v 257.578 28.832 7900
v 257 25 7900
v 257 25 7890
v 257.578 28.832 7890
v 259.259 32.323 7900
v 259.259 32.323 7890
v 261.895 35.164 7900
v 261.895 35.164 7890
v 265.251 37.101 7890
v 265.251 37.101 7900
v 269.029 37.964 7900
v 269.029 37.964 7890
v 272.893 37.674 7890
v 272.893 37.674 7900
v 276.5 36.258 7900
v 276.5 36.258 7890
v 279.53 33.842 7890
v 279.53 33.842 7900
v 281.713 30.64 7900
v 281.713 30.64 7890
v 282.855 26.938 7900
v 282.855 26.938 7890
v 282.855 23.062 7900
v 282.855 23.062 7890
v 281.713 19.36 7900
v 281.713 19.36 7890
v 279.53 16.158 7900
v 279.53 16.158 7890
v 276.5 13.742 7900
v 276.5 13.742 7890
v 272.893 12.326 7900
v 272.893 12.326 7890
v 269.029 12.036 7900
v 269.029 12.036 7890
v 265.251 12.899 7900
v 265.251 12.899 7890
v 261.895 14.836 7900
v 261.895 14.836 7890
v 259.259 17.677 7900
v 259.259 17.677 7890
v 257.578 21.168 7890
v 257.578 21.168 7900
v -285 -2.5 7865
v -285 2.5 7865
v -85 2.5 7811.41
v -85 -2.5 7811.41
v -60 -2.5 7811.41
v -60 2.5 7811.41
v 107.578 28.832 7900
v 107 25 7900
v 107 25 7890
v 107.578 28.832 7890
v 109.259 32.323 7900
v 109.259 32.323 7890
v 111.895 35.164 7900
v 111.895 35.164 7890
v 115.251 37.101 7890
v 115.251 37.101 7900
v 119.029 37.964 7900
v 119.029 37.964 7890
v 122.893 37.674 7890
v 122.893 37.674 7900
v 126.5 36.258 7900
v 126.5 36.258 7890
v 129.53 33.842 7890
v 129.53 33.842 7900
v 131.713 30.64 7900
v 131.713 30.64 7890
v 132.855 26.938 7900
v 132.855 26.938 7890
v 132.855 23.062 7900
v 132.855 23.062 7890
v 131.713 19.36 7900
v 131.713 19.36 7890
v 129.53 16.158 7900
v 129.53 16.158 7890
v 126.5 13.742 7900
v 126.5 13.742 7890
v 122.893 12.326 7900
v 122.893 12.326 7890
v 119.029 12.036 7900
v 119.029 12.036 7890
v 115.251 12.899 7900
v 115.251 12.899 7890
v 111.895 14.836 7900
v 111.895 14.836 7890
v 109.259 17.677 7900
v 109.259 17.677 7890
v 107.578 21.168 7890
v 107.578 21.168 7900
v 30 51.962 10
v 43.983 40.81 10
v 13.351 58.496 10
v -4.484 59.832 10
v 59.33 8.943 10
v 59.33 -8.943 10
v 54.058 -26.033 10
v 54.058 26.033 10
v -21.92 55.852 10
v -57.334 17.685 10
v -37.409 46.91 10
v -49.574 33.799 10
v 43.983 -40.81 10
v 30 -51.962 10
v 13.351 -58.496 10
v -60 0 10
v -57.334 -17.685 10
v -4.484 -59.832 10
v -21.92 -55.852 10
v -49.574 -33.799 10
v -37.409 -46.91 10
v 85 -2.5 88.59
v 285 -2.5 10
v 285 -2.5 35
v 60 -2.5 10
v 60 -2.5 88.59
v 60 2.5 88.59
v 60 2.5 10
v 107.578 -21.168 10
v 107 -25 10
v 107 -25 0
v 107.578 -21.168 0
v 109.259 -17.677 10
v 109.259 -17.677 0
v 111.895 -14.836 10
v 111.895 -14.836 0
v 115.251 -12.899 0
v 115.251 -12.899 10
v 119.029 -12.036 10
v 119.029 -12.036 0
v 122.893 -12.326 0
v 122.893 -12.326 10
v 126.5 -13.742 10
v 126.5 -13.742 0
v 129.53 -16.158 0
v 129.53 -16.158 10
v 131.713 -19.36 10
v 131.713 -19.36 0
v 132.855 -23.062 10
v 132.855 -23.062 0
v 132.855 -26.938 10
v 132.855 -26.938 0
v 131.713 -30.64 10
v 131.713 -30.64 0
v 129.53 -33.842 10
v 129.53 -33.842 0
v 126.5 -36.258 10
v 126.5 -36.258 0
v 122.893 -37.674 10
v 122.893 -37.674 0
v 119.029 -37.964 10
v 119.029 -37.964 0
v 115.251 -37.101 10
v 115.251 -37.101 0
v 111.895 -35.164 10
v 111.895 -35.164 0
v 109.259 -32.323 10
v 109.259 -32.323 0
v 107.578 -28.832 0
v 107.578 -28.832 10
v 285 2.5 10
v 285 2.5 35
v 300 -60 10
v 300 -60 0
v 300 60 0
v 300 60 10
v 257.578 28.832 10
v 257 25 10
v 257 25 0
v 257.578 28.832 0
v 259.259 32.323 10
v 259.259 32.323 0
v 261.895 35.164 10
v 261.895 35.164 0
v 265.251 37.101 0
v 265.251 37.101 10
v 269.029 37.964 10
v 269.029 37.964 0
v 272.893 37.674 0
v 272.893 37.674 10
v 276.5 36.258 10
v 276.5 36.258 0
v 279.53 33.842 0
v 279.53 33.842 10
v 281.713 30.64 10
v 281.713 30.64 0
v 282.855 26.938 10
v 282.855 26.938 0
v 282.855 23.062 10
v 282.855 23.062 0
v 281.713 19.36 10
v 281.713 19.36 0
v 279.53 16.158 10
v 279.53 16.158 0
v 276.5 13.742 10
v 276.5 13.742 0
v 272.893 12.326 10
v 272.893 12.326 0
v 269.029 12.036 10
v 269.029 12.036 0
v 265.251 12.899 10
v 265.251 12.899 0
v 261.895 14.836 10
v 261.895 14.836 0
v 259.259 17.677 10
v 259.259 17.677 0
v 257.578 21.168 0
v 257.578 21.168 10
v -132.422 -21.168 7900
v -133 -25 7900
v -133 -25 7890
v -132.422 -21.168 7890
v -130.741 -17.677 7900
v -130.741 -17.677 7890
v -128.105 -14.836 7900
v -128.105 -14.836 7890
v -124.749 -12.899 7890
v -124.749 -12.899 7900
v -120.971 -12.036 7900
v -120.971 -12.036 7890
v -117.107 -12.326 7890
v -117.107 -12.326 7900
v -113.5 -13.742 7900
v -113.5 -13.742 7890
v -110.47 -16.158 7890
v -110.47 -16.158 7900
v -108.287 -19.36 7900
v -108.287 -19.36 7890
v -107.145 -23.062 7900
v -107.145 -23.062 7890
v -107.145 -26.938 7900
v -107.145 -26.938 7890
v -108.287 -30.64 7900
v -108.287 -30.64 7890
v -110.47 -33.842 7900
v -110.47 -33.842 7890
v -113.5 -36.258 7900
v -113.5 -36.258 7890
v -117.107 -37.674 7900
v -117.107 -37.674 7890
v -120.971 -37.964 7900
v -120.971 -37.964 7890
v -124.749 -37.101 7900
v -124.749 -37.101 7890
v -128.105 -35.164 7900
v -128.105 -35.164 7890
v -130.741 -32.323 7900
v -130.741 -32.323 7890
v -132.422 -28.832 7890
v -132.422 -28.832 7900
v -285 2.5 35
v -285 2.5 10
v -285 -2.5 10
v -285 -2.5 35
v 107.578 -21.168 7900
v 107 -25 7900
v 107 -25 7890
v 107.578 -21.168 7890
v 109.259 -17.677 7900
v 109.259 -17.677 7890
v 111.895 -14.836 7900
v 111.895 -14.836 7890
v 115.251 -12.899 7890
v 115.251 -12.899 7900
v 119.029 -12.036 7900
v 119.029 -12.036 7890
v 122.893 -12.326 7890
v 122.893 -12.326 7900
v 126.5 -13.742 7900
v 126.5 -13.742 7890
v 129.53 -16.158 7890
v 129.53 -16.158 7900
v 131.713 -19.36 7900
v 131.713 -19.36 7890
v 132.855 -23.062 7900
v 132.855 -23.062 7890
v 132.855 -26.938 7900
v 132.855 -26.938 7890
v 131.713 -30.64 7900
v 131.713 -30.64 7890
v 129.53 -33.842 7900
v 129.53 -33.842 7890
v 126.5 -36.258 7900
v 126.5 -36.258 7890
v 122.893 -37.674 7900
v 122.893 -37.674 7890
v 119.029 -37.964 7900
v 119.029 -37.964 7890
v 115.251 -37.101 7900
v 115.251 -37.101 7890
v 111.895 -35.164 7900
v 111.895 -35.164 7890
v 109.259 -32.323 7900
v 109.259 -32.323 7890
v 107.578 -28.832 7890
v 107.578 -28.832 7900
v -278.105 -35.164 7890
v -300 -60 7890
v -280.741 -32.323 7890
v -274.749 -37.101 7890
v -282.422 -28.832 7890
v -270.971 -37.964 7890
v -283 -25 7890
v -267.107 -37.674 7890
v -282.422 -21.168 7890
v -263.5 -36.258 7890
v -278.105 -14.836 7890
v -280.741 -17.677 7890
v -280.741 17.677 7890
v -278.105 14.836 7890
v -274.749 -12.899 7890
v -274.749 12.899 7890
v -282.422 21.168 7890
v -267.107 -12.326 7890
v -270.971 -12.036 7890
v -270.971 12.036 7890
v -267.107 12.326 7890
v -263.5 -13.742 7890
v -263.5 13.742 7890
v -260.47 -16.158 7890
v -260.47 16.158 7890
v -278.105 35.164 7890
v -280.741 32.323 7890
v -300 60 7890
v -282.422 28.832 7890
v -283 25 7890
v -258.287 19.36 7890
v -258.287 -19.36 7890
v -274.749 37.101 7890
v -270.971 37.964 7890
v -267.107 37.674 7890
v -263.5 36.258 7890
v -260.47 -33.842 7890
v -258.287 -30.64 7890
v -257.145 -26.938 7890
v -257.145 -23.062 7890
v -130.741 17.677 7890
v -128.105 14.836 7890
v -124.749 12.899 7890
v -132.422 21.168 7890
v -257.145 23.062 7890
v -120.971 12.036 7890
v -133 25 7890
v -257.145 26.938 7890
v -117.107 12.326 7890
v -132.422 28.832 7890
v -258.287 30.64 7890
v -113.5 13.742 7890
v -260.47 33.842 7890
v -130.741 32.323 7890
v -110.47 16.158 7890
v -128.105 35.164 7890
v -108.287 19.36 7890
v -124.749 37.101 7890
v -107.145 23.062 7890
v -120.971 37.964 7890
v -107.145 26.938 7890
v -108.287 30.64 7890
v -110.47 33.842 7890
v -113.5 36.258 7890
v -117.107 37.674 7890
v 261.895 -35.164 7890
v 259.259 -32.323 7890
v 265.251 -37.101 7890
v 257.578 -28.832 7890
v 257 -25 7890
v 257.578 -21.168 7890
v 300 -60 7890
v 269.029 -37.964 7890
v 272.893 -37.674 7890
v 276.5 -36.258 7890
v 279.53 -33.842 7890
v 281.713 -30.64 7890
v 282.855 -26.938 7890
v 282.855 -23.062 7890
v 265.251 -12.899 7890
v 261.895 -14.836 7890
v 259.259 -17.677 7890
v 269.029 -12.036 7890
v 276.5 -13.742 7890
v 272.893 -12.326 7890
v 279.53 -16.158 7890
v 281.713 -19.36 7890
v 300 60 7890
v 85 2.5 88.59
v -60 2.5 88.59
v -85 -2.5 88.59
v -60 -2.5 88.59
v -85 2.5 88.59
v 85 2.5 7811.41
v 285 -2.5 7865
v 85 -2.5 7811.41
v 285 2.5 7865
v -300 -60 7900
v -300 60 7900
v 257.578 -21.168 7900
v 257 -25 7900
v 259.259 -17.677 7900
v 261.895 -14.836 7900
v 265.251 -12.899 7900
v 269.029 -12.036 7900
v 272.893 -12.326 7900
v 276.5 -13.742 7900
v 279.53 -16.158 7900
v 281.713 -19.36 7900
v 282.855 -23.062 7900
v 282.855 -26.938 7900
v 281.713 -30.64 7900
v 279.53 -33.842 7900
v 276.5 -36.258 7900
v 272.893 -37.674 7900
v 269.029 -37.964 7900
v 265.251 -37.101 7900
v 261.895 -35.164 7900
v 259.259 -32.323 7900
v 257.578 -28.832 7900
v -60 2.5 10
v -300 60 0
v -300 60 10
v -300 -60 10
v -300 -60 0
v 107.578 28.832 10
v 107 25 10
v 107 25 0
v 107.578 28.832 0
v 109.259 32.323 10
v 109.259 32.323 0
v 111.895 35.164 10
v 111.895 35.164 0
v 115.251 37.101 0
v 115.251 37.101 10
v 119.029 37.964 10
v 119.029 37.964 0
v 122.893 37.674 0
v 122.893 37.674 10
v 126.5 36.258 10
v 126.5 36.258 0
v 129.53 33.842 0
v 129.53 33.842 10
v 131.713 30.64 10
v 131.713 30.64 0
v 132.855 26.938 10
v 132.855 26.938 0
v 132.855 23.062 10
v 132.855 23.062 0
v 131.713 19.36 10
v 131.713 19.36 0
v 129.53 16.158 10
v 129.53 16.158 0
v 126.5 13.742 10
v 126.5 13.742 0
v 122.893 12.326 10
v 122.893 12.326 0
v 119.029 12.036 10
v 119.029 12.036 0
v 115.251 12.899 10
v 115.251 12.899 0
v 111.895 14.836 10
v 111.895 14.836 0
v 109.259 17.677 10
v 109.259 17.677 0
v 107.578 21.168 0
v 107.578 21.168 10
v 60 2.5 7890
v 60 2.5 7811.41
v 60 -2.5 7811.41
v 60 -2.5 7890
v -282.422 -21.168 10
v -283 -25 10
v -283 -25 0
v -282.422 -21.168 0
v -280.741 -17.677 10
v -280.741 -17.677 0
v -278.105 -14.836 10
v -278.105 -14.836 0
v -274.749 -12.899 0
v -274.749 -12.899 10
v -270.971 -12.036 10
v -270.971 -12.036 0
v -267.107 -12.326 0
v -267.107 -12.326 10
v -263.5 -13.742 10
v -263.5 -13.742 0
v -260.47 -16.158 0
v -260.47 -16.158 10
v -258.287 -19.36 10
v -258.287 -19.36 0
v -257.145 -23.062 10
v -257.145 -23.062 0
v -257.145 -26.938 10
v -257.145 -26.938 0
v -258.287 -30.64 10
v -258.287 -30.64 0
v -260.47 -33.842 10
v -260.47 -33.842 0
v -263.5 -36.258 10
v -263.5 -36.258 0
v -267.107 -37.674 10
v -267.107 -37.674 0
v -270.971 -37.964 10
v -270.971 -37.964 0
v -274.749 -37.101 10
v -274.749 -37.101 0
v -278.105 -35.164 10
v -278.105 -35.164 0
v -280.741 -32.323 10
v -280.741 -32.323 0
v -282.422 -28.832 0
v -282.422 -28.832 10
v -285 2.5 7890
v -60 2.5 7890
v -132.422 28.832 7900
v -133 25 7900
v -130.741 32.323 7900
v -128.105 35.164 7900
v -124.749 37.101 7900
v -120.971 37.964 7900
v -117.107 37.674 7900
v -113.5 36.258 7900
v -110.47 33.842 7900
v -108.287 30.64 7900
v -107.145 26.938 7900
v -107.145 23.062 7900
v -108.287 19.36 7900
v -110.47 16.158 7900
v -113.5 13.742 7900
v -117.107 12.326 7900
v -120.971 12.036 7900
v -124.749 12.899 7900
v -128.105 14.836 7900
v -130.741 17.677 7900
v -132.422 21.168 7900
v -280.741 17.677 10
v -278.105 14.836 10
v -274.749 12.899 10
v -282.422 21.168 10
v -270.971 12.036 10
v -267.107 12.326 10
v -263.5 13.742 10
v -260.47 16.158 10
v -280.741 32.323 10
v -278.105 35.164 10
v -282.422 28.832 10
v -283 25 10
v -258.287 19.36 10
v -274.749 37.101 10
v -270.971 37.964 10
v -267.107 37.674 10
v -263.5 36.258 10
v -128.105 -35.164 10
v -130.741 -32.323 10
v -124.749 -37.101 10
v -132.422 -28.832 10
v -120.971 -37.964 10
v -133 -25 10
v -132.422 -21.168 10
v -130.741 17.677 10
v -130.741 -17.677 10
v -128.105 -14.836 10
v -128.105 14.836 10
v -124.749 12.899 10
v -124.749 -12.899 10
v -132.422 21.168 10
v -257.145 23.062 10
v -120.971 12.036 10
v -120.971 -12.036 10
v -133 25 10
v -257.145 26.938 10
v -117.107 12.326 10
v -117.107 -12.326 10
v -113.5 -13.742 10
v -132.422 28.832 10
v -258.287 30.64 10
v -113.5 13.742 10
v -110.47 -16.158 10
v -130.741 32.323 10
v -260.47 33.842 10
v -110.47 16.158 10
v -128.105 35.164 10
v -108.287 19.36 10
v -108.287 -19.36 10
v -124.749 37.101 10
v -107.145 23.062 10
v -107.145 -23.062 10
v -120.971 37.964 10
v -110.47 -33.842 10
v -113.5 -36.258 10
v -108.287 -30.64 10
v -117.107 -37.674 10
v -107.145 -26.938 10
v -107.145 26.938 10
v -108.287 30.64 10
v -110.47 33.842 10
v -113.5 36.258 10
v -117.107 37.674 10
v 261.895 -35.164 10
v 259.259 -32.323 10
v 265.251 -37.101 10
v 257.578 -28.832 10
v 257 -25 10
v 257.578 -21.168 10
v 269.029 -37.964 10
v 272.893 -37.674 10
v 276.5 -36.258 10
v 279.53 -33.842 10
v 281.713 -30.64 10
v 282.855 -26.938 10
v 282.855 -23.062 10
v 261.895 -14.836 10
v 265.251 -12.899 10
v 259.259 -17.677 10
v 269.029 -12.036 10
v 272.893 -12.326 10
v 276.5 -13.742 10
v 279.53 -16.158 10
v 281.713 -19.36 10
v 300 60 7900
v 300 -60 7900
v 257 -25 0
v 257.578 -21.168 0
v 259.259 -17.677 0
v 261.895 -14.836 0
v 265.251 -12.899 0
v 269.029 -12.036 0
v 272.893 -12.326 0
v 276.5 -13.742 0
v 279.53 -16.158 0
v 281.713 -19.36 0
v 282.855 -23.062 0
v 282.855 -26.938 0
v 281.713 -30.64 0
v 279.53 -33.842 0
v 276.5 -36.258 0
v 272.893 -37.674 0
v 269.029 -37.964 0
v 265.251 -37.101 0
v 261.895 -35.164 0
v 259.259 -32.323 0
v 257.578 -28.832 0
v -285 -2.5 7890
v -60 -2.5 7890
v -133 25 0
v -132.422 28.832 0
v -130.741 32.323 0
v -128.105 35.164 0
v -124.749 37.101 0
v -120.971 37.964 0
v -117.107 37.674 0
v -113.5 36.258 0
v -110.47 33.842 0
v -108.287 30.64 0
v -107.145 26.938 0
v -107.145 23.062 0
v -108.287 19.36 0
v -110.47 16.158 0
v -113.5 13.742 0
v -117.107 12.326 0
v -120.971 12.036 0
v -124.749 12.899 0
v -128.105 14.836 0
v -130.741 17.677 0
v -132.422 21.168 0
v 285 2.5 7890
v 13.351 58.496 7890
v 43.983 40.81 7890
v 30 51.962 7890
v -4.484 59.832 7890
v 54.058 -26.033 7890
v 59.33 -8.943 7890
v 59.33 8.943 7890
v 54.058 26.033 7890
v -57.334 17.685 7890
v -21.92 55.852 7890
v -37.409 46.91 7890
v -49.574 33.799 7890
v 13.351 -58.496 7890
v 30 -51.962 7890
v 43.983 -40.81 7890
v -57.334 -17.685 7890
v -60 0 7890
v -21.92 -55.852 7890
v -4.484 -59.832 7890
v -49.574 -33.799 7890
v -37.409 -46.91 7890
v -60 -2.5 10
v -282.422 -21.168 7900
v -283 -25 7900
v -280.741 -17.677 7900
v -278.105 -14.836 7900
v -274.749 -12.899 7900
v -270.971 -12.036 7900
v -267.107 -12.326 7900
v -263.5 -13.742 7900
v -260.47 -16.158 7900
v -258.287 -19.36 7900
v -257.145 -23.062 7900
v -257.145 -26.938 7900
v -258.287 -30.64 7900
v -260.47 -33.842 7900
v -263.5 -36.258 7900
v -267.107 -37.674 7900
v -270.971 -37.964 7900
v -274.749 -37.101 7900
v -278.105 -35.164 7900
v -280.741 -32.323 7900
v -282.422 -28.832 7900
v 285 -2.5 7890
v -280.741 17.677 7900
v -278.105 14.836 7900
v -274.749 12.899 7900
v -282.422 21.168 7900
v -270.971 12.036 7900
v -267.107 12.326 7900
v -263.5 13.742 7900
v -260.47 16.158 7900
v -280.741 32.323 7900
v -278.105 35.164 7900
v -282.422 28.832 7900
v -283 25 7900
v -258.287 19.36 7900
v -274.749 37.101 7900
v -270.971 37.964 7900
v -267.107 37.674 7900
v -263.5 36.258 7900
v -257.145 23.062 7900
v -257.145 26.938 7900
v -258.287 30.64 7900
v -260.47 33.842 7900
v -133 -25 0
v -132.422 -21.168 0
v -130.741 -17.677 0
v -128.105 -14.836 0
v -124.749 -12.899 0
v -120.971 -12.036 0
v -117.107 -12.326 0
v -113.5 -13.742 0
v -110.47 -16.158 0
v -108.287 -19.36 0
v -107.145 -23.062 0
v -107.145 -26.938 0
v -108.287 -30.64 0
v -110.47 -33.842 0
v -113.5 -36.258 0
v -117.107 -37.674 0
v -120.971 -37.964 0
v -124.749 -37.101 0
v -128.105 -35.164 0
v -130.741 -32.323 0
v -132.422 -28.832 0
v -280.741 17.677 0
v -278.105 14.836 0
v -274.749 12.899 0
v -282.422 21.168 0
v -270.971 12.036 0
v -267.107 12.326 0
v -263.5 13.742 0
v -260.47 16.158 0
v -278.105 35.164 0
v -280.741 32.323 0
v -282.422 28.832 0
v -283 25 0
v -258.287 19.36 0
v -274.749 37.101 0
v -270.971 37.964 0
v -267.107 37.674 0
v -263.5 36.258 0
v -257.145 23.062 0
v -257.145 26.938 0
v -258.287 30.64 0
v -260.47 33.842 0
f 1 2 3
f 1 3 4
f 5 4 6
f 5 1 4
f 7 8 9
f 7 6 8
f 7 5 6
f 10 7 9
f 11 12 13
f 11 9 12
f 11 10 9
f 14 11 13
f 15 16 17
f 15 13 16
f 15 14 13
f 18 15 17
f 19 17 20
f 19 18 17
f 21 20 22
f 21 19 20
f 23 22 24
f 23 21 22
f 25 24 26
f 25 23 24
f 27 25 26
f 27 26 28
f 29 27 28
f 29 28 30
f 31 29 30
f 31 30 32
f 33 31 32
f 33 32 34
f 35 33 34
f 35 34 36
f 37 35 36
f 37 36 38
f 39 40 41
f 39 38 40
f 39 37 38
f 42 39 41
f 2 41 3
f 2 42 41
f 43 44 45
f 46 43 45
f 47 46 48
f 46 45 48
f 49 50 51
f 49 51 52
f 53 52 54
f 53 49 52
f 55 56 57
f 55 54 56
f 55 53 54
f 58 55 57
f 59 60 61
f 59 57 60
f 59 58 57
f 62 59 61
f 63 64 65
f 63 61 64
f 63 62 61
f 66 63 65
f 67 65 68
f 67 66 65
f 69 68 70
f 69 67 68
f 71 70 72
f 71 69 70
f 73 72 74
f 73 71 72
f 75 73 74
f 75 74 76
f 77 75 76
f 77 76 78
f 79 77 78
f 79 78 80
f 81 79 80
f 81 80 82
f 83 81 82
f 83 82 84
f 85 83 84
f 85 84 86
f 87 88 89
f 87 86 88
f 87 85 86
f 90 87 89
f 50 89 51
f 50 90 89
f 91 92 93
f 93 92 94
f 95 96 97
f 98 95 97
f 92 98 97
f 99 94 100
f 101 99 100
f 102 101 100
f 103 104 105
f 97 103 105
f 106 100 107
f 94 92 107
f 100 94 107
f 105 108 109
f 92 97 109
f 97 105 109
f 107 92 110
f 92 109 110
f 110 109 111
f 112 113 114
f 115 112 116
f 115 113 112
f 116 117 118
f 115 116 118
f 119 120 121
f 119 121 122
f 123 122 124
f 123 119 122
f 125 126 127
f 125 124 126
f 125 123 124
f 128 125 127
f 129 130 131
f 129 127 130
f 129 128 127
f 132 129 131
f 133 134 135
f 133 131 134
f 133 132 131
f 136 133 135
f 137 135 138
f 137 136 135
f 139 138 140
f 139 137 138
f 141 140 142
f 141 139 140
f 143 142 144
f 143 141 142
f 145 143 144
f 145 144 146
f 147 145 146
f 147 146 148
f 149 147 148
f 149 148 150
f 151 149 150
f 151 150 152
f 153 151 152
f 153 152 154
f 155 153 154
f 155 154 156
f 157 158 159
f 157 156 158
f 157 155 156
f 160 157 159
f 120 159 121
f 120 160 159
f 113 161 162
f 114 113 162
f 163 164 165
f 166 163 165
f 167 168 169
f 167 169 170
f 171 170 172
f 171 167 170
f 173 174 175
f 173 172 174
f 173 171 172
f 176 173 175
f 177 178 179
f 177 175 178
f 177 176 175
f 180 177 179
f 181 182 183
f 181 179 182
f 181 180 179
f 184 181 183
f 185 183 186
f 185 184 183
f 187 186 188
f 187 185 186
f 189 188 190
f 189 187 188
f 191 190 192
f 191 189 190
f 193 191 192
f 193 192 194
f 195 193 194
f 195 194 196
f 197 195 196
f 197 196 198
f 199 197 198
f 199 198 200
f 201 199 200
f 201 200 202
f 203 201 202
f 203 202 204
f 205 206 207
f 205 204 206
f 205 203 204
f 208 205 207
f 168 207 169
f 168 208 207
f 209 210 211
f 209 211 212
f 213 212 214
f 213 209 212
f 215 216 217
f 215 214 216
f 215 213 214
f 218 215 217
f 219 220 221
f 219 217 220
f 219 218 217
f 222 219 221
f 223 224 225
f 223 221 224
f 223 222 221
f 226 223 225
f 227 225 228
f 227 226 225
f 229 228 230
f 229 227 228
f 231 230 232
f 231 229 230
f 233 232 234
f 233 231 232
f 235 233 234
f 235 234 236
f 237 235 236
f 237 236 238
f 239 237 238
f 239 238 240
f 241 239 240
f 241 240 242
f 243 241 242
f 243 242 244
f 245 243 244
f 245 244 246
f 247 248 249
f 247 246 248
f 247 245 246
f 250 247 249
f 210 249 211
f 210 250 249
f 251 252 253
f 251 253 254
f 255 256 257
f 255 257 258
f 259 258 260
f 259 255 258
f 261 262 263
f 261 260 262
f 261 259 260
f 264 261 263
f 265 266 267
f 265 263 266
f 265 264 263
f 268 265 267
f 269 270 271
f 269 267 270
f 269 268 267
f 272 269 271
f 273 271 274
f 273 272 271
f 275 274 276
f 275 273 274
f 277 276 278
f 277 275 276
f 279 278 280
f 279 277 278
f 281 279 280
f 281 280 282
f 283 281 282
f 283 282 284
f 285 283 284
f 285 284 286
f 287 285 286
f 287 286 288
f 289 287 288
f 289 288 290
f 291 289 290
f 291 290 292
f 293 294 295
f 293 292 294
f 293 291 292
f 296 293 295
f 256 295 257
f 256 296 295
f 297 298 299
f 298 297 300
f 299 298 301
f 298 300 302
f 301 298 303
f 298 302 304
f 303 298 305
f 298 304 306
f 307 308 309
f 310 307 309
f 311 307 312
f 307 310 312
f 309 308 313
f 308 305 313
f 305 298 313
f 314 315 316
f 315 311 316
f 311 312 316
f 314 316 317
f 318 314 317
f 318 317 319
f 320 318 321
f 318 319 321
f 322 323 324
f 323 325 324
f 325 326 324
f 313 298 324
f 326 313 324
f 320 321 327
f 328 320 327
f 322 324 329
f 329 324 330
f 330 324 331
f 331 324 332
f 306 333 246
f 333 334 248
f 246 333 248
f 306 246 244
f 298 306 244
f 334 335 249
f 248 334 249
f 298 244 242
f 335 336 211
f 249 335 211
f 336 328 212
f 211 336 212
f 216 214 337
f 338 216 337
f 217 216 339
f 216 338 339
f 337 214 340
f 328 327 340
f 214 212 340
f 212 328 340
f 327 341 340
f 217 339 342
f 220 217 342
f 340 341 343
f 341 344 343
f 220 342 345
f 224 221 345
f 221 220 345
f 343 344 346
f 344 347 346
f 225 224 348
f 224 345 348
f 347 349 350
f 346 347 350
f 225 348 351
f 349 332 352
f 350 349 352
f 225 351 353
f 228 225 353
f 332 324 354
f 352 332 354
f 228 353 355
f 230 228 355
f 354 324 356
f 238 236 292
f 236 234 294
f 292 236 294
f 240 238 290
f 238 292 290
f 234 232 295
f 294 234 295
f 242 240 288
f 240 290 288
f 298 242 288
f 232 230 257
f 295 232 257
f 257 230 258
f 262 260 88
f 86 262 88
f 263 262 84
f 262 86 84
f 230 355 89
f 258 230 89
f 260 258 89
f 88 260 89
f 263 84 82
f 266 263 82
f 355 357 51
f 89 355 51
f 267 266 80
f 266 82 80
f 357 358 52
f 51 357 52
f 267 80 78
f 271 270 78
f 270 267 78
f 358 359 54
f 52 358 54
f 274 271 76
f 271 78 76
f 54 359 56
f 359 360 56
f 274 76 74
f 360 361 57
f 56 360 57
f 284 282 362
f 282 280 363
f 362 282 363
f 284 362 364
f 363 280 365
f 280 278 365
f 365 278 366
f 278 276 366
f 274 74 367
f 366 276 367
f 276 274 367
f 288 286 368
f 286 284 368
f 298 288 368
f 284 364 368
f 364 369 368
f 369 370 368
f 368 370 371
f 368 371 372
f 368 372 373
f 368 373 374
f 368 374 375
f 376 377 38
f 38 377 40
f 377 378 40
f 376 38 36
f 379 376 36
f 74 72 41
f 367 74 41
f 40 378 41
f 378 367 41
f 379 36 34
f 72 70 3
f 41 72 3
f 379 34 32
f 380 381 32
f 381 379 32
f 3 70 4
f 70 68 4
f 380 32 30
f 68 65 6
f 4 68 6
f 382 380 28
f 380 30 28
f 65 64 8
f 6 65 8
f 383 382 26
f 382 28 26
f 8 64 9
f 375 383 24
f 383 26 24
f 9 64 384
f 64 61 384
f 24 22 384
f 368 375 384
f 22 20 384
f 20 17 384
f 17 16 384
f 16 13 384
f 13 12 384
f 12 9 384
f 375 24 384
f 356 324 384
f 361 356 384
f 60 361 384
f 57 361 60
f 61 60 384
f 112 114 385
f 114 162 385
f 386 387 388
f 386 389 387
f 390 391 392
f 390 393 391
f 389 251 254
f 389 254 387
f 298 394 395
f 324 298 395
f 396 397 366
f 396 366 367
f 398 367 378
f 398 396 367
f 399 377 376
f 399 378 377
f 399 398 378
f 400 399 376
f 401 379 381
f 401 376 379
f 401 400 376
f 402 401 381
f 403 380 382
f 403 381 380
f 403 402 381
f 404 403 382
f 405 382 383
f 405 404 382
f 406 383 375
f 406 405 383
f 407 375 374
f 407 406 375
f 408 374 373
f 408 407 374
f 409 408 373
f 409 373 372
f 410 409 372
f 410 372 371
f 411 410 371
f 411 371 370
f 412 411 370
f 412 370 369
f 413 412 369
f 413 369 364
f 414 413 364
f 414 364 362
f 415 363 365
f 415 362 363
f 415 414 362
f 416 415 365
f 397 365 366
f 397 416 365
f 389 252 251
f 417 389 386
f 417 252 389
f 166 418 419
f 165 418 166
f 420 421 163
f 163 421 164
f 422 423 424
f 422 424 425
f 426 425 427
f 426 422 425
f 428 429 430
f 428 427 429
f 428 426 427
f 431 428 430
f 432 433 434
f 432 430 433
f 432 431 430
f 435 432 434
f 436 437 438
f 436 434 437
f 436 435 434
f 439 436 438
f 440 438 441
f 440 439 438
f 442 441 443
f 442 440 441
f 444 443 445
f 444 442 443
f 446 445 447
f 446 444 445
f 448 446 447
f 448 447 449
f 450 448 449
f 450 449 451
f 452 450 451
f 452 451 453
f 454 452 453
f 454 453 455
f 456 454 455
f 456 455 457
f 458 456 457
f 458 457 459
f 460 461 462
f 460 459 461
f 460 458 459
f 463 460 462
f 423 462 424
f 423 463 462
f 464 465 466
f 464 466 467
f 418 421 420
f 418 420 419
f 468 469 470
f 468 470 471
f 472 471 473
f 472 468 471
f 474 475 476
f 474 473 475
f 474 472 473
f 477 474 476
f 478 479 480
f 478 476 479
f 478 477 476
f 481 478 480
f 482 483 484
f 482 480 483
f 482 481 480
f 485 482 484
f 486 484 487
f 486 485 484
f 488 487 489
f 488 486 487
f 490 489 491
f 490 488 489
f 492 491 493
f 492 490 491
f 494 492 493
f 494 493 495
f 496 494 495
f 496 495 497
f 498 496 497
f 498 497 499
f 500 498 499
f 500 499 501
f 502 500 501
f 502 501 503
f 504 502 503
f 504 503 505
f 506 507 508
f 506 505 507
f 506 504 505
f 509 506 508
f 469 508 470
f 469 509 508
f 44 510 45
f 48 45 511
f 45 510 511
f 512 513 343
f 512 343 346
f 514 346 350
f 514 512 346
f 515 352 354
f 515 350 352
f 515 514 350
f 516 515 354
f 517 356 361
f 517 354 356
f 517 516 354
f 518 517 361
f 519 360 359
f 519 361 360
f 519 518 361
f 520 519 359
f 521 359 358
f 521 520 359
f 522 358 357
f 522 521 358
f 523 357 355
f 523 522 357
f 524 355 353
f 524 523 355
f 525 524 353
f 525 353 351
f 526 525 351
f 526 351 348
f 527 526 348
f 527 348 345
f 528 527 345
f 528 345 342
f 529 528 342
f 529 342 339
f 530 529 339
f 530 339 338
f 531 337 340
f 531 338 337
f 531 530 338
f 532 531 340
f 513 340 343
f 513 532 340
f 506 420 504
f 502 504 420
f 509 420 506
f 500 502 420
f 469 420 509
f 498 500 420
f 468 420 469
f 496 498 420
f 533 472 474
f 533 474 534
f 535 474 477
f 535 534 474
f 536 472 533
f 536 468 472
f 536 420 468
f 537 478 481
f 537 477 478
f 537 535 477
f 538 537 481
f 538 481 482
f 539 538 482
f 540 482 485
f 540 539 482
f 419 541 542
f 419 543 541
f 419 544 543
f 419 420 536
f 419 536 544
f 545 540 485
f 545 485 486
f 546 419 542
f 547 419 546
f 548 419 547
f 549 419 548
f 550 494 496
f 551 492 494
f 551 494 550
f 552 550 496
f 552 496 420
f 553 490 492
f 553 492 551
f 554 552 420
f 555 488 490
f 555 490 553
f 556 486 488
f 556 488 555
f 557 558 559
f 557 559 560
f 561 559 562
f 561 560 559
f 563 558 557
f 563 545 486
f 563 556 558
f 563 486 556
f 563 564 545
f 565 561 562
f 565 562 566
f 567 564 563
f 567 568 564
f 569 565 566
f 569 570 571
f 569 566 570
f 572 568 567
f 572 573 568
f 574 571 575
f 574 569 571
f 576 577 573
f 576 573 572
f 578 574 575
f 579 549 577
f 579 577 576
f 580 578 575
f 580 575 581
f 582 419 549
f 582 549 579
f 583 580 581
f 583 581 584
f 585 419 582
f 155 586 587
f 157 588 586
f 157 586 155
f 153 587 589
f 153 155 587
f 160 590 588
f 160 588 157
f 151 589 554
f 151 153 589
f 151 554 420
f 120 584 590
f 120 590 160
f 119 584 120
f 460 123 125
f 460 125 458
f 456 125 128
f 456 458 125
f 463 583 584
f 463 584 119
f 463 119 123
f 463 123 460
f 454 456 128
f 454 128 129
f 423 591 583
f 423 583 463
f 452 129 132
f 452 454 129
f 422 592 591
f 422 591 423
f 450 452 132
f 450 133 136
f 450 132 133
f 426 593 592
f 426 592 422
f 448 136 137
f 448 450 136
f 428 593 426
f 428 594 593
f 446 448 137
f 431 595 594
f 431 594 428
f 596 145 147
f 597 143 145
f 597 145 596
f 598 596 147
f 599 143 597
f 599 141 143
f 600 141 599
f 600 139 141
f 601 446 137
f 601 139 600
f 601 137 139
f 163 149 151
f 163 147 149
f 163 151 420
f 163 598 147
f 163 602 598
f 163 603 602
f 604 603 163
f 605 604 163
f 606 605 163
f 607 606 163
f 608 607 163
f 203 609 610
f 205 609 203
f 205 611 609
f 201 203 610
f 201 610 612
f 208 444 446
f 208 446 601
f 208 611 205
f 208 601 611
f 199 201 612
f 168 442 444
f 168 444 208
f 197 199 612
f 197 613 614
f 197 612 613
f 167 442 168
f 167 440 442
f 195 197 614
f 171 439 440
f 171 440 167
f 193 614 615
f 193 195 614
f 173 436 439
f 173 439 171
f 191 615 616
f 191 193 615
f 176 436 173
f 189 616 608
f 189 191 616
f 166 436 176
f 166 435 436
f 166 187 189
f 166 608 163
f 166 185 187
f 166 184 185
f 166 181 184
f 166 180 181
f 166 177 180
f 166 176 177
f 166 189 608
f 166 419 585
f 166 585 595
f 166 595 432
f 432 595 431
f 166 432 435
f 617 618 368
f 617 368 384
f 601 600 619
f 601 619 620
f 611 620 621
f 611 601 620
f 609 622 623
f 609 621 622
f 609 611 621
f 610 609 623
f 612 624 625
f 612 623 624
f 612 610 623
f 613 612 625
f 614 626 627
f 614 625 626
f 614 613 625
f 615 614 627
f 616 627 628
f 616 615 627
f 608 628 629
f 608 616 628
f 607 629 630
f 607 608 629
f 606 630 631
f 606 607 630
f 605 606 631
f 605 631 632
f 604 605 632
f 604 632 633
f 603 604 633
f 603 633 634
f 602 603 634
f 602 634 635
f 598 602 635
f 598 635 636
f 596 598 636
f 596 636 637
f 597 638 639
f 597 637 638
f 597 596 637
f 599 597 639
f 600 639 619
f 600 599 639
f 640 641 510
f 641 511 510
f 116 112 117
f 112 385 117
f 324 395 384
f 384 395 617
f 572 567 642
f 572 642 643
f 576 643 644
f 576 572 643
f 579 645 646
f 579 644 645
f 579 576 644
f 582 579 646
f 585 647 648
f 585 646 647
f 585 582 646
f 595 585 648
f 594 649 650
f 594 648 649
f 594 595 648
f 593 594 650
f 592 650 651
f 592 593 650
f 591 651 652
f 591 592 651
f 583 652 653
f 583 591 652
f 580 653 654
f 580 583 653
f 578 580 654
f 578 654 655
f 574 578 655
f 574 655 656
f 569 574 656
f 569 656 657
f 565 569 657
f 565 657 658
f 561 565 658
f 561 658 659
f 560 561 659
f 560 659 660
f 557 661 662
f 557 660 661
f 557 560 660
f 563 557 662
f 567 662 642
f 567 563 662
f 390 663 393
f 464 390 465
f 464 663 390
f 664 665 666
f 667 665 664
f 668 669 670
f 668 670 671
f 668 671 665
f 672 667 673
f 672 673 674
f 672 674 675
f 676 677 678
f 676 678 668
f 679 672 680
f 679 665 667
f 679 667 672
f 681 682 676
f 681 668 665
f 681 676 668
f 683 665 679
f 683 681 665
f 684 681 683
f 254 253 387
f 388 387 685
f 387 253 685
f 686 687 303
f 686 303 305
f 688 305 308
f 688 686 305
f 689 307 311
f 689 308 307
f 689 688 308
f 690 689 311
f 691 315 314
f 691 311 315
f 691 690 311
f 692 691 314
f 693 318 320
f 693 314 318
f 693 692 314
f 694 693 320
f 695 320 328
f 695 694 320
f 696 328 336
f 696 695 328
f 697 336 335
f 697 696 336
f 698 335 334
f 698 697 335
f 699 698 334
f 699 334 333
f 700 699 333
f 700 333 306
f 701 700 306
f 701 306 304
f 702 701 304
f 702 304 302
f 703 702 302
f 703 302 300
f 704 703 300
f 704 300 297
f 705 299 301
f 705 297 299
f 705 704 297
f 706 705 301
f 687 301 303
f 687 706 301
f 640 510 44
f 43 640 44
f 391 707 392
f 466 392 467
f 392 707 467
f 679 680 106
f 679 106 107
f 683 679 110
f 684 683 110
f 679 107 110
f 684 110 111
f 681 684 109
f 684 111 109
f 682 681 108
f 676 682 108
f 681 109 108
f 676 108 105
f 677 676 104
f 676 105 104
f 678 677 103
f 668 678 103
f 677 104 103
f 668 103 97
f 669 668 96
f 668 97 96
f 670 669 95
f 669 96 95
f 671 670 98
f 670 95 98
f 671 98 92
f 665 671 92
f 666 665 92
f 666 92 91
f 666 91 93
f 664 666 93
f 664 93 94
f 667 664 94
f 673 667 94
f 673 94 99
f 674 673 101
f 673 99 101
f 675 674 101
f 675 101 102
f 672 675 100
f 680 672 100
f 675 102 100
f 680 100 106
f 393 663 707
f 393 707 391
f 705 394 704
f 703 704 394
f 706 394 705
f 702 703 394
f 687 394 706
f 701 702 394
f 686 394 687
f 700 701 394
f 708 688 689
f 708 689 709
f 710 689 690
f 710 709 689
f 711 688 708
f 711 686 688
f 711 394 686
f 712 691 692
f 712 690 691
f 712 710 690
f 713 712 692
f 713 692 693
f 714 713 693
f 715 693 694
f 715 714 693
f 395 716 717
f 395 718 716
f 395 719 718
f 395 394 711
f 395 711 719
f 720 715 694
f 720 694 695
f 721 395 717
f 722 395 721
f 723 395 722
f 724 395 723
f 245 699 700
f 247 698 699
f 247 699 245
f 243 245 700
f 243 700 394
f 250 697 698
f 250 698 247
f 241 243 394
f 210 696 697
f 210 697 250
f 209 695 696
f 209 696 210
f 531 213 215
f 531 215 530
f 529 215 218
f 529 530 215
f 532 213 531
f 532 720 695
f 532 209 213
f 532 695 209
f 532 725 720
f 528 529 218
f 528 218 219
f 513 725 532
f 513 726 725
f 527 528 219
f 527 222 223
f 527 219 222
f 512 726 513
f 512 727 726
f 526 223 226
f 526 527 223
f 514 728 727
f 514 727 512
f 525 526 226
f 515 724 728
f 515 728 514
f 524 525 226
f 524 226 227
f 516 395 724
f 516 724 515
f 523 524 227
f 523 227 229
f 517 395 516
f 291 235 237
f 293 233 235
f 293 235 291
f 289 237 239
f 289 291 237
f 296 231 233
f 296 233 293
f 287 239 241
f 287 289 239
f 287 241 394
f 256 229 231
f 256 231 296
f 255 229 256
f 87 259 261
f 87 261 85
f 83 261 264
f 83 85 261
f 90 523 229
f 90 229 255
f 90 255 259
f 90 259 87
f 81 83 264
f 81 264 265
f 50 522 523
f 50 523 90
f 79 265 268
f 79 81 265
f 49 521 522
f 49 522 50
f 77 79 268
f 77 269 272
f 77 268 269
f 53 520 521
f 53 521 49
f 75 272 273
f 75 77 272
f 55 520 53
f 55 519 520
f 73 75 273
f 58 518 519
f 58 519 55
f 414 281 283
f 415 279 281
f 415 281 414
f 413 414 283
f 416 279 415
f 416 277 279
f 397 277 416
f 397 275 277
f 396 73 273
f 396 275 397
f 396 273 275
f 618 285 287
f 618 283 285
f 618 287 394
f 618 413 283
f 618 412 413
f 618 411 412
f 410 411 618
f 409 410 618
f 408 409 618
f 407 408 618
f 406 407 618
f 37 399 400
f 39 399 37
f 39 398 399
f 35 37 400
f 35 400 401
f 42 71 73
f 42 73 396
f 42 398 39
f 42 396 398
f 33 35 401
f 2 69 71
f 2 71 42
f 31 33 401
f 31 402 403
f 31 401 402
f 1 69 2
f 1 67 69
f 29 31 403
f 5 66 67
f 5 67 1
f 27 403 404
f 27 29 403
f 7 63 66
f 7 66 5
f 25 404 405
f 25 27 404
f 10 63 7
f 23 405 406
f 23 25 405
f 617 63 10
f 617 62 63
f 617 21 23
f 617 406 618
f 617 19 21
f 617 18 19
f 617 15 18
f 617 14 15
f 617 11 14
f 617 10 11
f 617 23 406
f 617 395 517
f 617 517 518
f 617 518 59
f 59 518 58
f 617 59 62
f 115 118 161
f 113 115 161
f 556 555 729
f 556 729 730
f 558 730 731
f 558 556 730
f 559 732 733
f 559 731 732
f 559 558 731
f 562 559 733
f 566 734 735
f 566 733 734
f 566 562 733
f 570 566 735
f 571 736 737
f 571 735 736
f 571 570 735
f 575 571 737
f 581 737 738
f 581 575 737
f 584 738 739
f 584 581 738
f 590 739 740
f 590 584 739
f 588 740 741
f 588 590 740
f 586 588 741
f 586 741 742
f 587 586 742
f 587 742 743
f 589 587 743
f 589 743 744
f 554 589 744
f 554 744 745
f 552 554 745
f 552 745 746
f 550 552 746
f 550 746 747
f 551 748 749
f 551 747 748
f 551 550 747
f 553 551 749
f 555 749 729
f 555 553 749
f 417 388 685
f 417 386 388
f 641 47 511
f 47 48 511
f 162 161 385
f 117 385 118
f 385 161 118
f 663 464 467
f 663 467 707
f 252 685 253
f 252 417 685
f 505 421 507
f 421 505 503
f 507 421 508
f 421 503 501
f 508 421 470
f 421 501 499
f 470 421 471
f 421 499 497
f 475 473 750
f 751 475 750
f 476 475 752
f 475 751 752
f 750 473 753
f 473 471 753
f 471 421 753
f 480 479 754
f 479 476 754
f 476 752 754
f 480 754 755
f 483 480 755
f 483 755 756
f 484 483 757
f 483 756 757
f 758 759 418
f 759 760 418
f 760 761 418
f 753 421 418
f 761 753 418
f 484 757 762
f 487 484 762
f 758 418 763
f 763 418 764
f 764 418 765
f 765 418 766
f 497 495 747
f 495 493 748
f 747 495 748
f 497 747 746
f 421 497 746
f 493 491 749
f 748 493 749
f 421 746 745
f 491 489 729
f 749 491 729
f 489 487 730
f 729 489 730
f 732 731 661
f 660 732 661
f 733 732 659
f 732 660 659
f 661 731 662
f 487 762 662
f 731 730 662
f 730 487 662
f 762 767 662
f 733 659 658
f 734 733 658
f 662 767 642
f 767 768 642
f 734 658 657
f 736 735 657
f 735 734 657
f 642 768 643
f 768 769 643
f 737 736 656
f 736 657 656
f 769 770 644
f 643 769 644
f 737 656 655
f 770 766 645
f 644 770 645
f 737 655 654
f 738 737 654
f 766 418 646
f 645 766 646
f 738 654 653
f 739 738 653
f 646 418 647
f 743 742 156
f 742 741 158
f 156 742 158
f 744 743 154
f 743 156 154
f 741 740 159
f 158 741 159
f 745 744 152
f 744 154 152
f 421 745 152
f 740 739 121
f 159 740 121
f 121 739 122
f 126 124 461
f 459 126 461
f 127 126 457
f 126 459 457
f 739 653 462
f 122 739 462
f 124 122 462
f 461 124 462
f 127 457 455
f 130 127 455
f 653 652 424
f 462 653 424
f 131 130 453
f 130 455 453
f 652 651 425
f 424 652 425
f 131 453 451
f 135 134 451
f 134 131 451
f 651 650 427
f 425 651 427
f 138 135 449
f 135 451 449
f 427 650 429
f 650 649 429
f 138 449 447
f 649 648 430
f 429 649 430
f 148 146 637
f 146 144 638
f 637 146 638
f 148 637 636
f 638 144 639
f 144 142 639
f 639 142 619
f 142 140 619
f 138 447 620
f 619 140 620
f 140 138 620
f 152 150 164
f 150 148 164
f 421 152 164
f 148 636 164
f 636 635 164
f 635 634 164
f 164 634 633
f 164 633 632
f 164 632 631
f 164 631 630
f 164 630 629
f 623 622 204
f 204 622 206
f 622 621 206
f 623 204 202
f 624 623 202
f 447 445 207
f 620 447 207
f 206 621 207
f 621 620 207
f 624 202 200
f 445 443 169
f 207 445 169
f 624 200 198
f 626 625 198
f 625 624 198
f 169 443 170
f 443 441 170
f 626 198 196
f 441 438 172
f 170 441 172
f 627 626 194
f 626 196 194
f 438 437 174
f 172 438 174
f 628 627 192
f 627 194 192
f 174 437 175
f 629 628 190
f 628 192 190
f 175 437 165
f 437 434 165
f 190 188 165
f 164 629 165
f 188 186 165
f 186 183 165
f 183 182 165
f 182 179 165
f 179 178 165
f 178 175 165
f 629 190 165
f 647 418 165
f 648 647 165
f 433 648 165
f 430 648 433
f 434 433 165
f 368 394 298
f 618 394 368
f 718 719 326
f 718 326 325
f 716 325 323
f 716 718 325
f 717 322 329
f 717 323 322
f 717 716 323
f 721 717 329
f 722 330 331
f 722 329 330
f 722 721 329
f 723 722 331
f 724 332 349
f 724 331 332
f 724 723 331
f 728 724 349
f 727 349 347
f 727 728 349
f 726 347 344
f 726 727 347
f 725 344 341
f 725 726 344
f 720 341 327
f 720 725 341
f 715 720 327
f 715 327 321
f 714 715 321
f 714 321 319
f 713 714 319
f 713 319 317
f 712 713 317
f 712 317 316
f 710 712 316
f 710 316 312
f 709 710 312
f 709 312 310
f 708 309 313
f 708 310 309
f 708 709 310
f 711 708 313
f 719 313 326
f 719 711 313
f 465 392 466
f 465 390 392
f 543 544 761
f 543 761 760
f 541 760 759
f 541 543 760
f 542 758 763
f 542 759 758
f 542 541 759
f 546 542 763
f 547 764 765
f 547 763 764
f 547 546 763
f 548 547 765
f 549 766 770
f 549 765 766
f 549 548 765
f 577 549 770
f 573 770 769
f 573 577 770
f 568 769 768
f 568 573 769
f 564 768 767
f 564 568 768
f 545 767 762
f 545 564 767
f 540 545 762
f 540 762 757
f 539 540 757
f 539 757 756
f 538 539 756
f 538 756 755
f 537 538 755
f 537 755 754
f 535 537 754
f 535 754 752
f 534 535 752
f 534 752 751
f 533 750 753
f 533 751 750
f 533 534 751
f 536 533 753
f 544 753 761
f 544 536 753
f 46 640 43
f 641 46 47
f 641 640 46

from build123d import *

# Parameters (mm, degrees)
SKETCH1_W               = 600
SKETCH1_H               = 120
BOSS_EXTRUDE1_DEPTH     = 10
SKETCH2_R               = 60
BOSS_EXTRUDE2_DEPTH     = 7880
BOSS_EXTRUDE3_DEPTH     = 2.5
BOSS_EXTRUDE3_2_DEPTH   = 2.5
CUT_EXTRUDE1_DEPTH      = 3962.830385062
CUT_EXTRUDE1_DEPTH_BACK = 3962.830385062
SKETCH6_R               = 13


with BuildPart() as part:
    # Sketch1 → Boss-Extrude1 (new body)
    with BuildSketch(Plane.XY):
        Rectangle(SKETCH1_W, SKETCH1_H)
    extrude(amount=BOSS_EXTRUDE1_DEPTH)


with BuildPart() as body_2:
    # Sketch2 → Boss-Extrude2 (new body)
    with BuildSketch(Plane.XY.offset(10)):
        with Locations(Location((0, 0, 0), (0, 0, 180))):
            Circle(SKETCH2_R)
    extrude(amount=BOSS_EXTRUDE2_DEPTH)


with BuildPart() as body_3:
    # Sketch4 → Boss-Extrude3 (new, symmetric)
    with BuildSketch(Plane(origin=(0, 0, 0), x_dir=(1, 0, 0), z_dir=(0, 1, 0))):
        Polygon((285, -10), (285, -35), (85, -88.589838486), (60, -88.589838486), (60, -10), align=None)
    extrude(amount=BOSS_EXTRUDE3_DEPTH, both=True)


with BuildPart() as body_4:
    # Sketch4 → Boss-Extrude3 2 (new, symmetric)
    with BuildSketch(Plane(origin=(0, 0, 0), x_dir=(1, 0, 0), z_dir=(0, 1, 0))):
        Polygon((-60, -10), (-285, -10), (-285, -35), (-85, -88.589838486), (-60, -88.589838486), align=None)
    extrude(amount=BOSS_EXTRUDE3_2_DEPTH, both=True)


with BuildPart() as body_5:
    # Mirror1: mirrored copy
    add(part.part.mirror(Plane(origin=(0, 0, 3950), x_dir=(1, 0, 0), z_dir=(0, 0, -1))))


with BuildPart() as body_6:
    # Mirror1 2: mirrored copy
    add(body_4.part.mirror(Plane(origin=(0, 0, 3950), x_dir=(1, 0, 0), z_dir=(0, 0, -1))))


with BuildPart() as body_7:
    # Mirror1 3: mirrored copy
    add(body_3.part.mirror(Plane(origin=(0, 0, 3950), x_dir=(1, 0, 0), z_dir=(0, 0, -1))))


with BuildPart() as cut_extrude1_tool:
    # Sketch6 → Cut-Extrude1 (new, two sides: drawn at the far end of the back side and taken through both)
    with BuildSketch(Plane(origin=(0, 0, 3950), x_dir=(-1, 0, 0), z_dir=(0, 0, -1)).offset(-CUT_EXTRUDE1_DEPTH_BACK)):
        with Locations((270, 25)):
            Circle(SKETCH6_R)
        with Locations((270, -25)):
            Circle(SKETCH6_R)
        with Locations((120, 25)):
            Circle(SKETCH6_R)
        with Locations((120, -25)):
            Circle(SKETCH6_R)
        with Locations((-120, -25)):
            Circle(SKETCH6_R)
        with Locations((-120, 25)):
            Circle(SKETCH6_R)
        with Locations((-270, -25)):
            Circle(SKETCH6_R)
        with Locations((-270, 25)):
            Circle(SKETCH6_R)
    extrude(amount=CUT_EXTRUDE1_DEPTH + CUT_EXTRUDE1_DEPTH_BACK)


with BuildPart() as part_1:
    add(part.part)

    # Cut-Extrude1: cut by cut_extrude1_tool
    add(cut_extrude1_tool.part, mode=Mode.SUBTRACT)


with BuildPart() as body_5_1:
    add(body_5.part)

    # Cut-Extrude1: cut by cut_extrude1_tool
    add(cut_extrude1_tool.part, mode=Mode.SUBTRACT)


solid = Compound([body_2.part, body_3.part, body_4.part, body_6.part, body_7.part, part_1.part, body_5_1.part])
